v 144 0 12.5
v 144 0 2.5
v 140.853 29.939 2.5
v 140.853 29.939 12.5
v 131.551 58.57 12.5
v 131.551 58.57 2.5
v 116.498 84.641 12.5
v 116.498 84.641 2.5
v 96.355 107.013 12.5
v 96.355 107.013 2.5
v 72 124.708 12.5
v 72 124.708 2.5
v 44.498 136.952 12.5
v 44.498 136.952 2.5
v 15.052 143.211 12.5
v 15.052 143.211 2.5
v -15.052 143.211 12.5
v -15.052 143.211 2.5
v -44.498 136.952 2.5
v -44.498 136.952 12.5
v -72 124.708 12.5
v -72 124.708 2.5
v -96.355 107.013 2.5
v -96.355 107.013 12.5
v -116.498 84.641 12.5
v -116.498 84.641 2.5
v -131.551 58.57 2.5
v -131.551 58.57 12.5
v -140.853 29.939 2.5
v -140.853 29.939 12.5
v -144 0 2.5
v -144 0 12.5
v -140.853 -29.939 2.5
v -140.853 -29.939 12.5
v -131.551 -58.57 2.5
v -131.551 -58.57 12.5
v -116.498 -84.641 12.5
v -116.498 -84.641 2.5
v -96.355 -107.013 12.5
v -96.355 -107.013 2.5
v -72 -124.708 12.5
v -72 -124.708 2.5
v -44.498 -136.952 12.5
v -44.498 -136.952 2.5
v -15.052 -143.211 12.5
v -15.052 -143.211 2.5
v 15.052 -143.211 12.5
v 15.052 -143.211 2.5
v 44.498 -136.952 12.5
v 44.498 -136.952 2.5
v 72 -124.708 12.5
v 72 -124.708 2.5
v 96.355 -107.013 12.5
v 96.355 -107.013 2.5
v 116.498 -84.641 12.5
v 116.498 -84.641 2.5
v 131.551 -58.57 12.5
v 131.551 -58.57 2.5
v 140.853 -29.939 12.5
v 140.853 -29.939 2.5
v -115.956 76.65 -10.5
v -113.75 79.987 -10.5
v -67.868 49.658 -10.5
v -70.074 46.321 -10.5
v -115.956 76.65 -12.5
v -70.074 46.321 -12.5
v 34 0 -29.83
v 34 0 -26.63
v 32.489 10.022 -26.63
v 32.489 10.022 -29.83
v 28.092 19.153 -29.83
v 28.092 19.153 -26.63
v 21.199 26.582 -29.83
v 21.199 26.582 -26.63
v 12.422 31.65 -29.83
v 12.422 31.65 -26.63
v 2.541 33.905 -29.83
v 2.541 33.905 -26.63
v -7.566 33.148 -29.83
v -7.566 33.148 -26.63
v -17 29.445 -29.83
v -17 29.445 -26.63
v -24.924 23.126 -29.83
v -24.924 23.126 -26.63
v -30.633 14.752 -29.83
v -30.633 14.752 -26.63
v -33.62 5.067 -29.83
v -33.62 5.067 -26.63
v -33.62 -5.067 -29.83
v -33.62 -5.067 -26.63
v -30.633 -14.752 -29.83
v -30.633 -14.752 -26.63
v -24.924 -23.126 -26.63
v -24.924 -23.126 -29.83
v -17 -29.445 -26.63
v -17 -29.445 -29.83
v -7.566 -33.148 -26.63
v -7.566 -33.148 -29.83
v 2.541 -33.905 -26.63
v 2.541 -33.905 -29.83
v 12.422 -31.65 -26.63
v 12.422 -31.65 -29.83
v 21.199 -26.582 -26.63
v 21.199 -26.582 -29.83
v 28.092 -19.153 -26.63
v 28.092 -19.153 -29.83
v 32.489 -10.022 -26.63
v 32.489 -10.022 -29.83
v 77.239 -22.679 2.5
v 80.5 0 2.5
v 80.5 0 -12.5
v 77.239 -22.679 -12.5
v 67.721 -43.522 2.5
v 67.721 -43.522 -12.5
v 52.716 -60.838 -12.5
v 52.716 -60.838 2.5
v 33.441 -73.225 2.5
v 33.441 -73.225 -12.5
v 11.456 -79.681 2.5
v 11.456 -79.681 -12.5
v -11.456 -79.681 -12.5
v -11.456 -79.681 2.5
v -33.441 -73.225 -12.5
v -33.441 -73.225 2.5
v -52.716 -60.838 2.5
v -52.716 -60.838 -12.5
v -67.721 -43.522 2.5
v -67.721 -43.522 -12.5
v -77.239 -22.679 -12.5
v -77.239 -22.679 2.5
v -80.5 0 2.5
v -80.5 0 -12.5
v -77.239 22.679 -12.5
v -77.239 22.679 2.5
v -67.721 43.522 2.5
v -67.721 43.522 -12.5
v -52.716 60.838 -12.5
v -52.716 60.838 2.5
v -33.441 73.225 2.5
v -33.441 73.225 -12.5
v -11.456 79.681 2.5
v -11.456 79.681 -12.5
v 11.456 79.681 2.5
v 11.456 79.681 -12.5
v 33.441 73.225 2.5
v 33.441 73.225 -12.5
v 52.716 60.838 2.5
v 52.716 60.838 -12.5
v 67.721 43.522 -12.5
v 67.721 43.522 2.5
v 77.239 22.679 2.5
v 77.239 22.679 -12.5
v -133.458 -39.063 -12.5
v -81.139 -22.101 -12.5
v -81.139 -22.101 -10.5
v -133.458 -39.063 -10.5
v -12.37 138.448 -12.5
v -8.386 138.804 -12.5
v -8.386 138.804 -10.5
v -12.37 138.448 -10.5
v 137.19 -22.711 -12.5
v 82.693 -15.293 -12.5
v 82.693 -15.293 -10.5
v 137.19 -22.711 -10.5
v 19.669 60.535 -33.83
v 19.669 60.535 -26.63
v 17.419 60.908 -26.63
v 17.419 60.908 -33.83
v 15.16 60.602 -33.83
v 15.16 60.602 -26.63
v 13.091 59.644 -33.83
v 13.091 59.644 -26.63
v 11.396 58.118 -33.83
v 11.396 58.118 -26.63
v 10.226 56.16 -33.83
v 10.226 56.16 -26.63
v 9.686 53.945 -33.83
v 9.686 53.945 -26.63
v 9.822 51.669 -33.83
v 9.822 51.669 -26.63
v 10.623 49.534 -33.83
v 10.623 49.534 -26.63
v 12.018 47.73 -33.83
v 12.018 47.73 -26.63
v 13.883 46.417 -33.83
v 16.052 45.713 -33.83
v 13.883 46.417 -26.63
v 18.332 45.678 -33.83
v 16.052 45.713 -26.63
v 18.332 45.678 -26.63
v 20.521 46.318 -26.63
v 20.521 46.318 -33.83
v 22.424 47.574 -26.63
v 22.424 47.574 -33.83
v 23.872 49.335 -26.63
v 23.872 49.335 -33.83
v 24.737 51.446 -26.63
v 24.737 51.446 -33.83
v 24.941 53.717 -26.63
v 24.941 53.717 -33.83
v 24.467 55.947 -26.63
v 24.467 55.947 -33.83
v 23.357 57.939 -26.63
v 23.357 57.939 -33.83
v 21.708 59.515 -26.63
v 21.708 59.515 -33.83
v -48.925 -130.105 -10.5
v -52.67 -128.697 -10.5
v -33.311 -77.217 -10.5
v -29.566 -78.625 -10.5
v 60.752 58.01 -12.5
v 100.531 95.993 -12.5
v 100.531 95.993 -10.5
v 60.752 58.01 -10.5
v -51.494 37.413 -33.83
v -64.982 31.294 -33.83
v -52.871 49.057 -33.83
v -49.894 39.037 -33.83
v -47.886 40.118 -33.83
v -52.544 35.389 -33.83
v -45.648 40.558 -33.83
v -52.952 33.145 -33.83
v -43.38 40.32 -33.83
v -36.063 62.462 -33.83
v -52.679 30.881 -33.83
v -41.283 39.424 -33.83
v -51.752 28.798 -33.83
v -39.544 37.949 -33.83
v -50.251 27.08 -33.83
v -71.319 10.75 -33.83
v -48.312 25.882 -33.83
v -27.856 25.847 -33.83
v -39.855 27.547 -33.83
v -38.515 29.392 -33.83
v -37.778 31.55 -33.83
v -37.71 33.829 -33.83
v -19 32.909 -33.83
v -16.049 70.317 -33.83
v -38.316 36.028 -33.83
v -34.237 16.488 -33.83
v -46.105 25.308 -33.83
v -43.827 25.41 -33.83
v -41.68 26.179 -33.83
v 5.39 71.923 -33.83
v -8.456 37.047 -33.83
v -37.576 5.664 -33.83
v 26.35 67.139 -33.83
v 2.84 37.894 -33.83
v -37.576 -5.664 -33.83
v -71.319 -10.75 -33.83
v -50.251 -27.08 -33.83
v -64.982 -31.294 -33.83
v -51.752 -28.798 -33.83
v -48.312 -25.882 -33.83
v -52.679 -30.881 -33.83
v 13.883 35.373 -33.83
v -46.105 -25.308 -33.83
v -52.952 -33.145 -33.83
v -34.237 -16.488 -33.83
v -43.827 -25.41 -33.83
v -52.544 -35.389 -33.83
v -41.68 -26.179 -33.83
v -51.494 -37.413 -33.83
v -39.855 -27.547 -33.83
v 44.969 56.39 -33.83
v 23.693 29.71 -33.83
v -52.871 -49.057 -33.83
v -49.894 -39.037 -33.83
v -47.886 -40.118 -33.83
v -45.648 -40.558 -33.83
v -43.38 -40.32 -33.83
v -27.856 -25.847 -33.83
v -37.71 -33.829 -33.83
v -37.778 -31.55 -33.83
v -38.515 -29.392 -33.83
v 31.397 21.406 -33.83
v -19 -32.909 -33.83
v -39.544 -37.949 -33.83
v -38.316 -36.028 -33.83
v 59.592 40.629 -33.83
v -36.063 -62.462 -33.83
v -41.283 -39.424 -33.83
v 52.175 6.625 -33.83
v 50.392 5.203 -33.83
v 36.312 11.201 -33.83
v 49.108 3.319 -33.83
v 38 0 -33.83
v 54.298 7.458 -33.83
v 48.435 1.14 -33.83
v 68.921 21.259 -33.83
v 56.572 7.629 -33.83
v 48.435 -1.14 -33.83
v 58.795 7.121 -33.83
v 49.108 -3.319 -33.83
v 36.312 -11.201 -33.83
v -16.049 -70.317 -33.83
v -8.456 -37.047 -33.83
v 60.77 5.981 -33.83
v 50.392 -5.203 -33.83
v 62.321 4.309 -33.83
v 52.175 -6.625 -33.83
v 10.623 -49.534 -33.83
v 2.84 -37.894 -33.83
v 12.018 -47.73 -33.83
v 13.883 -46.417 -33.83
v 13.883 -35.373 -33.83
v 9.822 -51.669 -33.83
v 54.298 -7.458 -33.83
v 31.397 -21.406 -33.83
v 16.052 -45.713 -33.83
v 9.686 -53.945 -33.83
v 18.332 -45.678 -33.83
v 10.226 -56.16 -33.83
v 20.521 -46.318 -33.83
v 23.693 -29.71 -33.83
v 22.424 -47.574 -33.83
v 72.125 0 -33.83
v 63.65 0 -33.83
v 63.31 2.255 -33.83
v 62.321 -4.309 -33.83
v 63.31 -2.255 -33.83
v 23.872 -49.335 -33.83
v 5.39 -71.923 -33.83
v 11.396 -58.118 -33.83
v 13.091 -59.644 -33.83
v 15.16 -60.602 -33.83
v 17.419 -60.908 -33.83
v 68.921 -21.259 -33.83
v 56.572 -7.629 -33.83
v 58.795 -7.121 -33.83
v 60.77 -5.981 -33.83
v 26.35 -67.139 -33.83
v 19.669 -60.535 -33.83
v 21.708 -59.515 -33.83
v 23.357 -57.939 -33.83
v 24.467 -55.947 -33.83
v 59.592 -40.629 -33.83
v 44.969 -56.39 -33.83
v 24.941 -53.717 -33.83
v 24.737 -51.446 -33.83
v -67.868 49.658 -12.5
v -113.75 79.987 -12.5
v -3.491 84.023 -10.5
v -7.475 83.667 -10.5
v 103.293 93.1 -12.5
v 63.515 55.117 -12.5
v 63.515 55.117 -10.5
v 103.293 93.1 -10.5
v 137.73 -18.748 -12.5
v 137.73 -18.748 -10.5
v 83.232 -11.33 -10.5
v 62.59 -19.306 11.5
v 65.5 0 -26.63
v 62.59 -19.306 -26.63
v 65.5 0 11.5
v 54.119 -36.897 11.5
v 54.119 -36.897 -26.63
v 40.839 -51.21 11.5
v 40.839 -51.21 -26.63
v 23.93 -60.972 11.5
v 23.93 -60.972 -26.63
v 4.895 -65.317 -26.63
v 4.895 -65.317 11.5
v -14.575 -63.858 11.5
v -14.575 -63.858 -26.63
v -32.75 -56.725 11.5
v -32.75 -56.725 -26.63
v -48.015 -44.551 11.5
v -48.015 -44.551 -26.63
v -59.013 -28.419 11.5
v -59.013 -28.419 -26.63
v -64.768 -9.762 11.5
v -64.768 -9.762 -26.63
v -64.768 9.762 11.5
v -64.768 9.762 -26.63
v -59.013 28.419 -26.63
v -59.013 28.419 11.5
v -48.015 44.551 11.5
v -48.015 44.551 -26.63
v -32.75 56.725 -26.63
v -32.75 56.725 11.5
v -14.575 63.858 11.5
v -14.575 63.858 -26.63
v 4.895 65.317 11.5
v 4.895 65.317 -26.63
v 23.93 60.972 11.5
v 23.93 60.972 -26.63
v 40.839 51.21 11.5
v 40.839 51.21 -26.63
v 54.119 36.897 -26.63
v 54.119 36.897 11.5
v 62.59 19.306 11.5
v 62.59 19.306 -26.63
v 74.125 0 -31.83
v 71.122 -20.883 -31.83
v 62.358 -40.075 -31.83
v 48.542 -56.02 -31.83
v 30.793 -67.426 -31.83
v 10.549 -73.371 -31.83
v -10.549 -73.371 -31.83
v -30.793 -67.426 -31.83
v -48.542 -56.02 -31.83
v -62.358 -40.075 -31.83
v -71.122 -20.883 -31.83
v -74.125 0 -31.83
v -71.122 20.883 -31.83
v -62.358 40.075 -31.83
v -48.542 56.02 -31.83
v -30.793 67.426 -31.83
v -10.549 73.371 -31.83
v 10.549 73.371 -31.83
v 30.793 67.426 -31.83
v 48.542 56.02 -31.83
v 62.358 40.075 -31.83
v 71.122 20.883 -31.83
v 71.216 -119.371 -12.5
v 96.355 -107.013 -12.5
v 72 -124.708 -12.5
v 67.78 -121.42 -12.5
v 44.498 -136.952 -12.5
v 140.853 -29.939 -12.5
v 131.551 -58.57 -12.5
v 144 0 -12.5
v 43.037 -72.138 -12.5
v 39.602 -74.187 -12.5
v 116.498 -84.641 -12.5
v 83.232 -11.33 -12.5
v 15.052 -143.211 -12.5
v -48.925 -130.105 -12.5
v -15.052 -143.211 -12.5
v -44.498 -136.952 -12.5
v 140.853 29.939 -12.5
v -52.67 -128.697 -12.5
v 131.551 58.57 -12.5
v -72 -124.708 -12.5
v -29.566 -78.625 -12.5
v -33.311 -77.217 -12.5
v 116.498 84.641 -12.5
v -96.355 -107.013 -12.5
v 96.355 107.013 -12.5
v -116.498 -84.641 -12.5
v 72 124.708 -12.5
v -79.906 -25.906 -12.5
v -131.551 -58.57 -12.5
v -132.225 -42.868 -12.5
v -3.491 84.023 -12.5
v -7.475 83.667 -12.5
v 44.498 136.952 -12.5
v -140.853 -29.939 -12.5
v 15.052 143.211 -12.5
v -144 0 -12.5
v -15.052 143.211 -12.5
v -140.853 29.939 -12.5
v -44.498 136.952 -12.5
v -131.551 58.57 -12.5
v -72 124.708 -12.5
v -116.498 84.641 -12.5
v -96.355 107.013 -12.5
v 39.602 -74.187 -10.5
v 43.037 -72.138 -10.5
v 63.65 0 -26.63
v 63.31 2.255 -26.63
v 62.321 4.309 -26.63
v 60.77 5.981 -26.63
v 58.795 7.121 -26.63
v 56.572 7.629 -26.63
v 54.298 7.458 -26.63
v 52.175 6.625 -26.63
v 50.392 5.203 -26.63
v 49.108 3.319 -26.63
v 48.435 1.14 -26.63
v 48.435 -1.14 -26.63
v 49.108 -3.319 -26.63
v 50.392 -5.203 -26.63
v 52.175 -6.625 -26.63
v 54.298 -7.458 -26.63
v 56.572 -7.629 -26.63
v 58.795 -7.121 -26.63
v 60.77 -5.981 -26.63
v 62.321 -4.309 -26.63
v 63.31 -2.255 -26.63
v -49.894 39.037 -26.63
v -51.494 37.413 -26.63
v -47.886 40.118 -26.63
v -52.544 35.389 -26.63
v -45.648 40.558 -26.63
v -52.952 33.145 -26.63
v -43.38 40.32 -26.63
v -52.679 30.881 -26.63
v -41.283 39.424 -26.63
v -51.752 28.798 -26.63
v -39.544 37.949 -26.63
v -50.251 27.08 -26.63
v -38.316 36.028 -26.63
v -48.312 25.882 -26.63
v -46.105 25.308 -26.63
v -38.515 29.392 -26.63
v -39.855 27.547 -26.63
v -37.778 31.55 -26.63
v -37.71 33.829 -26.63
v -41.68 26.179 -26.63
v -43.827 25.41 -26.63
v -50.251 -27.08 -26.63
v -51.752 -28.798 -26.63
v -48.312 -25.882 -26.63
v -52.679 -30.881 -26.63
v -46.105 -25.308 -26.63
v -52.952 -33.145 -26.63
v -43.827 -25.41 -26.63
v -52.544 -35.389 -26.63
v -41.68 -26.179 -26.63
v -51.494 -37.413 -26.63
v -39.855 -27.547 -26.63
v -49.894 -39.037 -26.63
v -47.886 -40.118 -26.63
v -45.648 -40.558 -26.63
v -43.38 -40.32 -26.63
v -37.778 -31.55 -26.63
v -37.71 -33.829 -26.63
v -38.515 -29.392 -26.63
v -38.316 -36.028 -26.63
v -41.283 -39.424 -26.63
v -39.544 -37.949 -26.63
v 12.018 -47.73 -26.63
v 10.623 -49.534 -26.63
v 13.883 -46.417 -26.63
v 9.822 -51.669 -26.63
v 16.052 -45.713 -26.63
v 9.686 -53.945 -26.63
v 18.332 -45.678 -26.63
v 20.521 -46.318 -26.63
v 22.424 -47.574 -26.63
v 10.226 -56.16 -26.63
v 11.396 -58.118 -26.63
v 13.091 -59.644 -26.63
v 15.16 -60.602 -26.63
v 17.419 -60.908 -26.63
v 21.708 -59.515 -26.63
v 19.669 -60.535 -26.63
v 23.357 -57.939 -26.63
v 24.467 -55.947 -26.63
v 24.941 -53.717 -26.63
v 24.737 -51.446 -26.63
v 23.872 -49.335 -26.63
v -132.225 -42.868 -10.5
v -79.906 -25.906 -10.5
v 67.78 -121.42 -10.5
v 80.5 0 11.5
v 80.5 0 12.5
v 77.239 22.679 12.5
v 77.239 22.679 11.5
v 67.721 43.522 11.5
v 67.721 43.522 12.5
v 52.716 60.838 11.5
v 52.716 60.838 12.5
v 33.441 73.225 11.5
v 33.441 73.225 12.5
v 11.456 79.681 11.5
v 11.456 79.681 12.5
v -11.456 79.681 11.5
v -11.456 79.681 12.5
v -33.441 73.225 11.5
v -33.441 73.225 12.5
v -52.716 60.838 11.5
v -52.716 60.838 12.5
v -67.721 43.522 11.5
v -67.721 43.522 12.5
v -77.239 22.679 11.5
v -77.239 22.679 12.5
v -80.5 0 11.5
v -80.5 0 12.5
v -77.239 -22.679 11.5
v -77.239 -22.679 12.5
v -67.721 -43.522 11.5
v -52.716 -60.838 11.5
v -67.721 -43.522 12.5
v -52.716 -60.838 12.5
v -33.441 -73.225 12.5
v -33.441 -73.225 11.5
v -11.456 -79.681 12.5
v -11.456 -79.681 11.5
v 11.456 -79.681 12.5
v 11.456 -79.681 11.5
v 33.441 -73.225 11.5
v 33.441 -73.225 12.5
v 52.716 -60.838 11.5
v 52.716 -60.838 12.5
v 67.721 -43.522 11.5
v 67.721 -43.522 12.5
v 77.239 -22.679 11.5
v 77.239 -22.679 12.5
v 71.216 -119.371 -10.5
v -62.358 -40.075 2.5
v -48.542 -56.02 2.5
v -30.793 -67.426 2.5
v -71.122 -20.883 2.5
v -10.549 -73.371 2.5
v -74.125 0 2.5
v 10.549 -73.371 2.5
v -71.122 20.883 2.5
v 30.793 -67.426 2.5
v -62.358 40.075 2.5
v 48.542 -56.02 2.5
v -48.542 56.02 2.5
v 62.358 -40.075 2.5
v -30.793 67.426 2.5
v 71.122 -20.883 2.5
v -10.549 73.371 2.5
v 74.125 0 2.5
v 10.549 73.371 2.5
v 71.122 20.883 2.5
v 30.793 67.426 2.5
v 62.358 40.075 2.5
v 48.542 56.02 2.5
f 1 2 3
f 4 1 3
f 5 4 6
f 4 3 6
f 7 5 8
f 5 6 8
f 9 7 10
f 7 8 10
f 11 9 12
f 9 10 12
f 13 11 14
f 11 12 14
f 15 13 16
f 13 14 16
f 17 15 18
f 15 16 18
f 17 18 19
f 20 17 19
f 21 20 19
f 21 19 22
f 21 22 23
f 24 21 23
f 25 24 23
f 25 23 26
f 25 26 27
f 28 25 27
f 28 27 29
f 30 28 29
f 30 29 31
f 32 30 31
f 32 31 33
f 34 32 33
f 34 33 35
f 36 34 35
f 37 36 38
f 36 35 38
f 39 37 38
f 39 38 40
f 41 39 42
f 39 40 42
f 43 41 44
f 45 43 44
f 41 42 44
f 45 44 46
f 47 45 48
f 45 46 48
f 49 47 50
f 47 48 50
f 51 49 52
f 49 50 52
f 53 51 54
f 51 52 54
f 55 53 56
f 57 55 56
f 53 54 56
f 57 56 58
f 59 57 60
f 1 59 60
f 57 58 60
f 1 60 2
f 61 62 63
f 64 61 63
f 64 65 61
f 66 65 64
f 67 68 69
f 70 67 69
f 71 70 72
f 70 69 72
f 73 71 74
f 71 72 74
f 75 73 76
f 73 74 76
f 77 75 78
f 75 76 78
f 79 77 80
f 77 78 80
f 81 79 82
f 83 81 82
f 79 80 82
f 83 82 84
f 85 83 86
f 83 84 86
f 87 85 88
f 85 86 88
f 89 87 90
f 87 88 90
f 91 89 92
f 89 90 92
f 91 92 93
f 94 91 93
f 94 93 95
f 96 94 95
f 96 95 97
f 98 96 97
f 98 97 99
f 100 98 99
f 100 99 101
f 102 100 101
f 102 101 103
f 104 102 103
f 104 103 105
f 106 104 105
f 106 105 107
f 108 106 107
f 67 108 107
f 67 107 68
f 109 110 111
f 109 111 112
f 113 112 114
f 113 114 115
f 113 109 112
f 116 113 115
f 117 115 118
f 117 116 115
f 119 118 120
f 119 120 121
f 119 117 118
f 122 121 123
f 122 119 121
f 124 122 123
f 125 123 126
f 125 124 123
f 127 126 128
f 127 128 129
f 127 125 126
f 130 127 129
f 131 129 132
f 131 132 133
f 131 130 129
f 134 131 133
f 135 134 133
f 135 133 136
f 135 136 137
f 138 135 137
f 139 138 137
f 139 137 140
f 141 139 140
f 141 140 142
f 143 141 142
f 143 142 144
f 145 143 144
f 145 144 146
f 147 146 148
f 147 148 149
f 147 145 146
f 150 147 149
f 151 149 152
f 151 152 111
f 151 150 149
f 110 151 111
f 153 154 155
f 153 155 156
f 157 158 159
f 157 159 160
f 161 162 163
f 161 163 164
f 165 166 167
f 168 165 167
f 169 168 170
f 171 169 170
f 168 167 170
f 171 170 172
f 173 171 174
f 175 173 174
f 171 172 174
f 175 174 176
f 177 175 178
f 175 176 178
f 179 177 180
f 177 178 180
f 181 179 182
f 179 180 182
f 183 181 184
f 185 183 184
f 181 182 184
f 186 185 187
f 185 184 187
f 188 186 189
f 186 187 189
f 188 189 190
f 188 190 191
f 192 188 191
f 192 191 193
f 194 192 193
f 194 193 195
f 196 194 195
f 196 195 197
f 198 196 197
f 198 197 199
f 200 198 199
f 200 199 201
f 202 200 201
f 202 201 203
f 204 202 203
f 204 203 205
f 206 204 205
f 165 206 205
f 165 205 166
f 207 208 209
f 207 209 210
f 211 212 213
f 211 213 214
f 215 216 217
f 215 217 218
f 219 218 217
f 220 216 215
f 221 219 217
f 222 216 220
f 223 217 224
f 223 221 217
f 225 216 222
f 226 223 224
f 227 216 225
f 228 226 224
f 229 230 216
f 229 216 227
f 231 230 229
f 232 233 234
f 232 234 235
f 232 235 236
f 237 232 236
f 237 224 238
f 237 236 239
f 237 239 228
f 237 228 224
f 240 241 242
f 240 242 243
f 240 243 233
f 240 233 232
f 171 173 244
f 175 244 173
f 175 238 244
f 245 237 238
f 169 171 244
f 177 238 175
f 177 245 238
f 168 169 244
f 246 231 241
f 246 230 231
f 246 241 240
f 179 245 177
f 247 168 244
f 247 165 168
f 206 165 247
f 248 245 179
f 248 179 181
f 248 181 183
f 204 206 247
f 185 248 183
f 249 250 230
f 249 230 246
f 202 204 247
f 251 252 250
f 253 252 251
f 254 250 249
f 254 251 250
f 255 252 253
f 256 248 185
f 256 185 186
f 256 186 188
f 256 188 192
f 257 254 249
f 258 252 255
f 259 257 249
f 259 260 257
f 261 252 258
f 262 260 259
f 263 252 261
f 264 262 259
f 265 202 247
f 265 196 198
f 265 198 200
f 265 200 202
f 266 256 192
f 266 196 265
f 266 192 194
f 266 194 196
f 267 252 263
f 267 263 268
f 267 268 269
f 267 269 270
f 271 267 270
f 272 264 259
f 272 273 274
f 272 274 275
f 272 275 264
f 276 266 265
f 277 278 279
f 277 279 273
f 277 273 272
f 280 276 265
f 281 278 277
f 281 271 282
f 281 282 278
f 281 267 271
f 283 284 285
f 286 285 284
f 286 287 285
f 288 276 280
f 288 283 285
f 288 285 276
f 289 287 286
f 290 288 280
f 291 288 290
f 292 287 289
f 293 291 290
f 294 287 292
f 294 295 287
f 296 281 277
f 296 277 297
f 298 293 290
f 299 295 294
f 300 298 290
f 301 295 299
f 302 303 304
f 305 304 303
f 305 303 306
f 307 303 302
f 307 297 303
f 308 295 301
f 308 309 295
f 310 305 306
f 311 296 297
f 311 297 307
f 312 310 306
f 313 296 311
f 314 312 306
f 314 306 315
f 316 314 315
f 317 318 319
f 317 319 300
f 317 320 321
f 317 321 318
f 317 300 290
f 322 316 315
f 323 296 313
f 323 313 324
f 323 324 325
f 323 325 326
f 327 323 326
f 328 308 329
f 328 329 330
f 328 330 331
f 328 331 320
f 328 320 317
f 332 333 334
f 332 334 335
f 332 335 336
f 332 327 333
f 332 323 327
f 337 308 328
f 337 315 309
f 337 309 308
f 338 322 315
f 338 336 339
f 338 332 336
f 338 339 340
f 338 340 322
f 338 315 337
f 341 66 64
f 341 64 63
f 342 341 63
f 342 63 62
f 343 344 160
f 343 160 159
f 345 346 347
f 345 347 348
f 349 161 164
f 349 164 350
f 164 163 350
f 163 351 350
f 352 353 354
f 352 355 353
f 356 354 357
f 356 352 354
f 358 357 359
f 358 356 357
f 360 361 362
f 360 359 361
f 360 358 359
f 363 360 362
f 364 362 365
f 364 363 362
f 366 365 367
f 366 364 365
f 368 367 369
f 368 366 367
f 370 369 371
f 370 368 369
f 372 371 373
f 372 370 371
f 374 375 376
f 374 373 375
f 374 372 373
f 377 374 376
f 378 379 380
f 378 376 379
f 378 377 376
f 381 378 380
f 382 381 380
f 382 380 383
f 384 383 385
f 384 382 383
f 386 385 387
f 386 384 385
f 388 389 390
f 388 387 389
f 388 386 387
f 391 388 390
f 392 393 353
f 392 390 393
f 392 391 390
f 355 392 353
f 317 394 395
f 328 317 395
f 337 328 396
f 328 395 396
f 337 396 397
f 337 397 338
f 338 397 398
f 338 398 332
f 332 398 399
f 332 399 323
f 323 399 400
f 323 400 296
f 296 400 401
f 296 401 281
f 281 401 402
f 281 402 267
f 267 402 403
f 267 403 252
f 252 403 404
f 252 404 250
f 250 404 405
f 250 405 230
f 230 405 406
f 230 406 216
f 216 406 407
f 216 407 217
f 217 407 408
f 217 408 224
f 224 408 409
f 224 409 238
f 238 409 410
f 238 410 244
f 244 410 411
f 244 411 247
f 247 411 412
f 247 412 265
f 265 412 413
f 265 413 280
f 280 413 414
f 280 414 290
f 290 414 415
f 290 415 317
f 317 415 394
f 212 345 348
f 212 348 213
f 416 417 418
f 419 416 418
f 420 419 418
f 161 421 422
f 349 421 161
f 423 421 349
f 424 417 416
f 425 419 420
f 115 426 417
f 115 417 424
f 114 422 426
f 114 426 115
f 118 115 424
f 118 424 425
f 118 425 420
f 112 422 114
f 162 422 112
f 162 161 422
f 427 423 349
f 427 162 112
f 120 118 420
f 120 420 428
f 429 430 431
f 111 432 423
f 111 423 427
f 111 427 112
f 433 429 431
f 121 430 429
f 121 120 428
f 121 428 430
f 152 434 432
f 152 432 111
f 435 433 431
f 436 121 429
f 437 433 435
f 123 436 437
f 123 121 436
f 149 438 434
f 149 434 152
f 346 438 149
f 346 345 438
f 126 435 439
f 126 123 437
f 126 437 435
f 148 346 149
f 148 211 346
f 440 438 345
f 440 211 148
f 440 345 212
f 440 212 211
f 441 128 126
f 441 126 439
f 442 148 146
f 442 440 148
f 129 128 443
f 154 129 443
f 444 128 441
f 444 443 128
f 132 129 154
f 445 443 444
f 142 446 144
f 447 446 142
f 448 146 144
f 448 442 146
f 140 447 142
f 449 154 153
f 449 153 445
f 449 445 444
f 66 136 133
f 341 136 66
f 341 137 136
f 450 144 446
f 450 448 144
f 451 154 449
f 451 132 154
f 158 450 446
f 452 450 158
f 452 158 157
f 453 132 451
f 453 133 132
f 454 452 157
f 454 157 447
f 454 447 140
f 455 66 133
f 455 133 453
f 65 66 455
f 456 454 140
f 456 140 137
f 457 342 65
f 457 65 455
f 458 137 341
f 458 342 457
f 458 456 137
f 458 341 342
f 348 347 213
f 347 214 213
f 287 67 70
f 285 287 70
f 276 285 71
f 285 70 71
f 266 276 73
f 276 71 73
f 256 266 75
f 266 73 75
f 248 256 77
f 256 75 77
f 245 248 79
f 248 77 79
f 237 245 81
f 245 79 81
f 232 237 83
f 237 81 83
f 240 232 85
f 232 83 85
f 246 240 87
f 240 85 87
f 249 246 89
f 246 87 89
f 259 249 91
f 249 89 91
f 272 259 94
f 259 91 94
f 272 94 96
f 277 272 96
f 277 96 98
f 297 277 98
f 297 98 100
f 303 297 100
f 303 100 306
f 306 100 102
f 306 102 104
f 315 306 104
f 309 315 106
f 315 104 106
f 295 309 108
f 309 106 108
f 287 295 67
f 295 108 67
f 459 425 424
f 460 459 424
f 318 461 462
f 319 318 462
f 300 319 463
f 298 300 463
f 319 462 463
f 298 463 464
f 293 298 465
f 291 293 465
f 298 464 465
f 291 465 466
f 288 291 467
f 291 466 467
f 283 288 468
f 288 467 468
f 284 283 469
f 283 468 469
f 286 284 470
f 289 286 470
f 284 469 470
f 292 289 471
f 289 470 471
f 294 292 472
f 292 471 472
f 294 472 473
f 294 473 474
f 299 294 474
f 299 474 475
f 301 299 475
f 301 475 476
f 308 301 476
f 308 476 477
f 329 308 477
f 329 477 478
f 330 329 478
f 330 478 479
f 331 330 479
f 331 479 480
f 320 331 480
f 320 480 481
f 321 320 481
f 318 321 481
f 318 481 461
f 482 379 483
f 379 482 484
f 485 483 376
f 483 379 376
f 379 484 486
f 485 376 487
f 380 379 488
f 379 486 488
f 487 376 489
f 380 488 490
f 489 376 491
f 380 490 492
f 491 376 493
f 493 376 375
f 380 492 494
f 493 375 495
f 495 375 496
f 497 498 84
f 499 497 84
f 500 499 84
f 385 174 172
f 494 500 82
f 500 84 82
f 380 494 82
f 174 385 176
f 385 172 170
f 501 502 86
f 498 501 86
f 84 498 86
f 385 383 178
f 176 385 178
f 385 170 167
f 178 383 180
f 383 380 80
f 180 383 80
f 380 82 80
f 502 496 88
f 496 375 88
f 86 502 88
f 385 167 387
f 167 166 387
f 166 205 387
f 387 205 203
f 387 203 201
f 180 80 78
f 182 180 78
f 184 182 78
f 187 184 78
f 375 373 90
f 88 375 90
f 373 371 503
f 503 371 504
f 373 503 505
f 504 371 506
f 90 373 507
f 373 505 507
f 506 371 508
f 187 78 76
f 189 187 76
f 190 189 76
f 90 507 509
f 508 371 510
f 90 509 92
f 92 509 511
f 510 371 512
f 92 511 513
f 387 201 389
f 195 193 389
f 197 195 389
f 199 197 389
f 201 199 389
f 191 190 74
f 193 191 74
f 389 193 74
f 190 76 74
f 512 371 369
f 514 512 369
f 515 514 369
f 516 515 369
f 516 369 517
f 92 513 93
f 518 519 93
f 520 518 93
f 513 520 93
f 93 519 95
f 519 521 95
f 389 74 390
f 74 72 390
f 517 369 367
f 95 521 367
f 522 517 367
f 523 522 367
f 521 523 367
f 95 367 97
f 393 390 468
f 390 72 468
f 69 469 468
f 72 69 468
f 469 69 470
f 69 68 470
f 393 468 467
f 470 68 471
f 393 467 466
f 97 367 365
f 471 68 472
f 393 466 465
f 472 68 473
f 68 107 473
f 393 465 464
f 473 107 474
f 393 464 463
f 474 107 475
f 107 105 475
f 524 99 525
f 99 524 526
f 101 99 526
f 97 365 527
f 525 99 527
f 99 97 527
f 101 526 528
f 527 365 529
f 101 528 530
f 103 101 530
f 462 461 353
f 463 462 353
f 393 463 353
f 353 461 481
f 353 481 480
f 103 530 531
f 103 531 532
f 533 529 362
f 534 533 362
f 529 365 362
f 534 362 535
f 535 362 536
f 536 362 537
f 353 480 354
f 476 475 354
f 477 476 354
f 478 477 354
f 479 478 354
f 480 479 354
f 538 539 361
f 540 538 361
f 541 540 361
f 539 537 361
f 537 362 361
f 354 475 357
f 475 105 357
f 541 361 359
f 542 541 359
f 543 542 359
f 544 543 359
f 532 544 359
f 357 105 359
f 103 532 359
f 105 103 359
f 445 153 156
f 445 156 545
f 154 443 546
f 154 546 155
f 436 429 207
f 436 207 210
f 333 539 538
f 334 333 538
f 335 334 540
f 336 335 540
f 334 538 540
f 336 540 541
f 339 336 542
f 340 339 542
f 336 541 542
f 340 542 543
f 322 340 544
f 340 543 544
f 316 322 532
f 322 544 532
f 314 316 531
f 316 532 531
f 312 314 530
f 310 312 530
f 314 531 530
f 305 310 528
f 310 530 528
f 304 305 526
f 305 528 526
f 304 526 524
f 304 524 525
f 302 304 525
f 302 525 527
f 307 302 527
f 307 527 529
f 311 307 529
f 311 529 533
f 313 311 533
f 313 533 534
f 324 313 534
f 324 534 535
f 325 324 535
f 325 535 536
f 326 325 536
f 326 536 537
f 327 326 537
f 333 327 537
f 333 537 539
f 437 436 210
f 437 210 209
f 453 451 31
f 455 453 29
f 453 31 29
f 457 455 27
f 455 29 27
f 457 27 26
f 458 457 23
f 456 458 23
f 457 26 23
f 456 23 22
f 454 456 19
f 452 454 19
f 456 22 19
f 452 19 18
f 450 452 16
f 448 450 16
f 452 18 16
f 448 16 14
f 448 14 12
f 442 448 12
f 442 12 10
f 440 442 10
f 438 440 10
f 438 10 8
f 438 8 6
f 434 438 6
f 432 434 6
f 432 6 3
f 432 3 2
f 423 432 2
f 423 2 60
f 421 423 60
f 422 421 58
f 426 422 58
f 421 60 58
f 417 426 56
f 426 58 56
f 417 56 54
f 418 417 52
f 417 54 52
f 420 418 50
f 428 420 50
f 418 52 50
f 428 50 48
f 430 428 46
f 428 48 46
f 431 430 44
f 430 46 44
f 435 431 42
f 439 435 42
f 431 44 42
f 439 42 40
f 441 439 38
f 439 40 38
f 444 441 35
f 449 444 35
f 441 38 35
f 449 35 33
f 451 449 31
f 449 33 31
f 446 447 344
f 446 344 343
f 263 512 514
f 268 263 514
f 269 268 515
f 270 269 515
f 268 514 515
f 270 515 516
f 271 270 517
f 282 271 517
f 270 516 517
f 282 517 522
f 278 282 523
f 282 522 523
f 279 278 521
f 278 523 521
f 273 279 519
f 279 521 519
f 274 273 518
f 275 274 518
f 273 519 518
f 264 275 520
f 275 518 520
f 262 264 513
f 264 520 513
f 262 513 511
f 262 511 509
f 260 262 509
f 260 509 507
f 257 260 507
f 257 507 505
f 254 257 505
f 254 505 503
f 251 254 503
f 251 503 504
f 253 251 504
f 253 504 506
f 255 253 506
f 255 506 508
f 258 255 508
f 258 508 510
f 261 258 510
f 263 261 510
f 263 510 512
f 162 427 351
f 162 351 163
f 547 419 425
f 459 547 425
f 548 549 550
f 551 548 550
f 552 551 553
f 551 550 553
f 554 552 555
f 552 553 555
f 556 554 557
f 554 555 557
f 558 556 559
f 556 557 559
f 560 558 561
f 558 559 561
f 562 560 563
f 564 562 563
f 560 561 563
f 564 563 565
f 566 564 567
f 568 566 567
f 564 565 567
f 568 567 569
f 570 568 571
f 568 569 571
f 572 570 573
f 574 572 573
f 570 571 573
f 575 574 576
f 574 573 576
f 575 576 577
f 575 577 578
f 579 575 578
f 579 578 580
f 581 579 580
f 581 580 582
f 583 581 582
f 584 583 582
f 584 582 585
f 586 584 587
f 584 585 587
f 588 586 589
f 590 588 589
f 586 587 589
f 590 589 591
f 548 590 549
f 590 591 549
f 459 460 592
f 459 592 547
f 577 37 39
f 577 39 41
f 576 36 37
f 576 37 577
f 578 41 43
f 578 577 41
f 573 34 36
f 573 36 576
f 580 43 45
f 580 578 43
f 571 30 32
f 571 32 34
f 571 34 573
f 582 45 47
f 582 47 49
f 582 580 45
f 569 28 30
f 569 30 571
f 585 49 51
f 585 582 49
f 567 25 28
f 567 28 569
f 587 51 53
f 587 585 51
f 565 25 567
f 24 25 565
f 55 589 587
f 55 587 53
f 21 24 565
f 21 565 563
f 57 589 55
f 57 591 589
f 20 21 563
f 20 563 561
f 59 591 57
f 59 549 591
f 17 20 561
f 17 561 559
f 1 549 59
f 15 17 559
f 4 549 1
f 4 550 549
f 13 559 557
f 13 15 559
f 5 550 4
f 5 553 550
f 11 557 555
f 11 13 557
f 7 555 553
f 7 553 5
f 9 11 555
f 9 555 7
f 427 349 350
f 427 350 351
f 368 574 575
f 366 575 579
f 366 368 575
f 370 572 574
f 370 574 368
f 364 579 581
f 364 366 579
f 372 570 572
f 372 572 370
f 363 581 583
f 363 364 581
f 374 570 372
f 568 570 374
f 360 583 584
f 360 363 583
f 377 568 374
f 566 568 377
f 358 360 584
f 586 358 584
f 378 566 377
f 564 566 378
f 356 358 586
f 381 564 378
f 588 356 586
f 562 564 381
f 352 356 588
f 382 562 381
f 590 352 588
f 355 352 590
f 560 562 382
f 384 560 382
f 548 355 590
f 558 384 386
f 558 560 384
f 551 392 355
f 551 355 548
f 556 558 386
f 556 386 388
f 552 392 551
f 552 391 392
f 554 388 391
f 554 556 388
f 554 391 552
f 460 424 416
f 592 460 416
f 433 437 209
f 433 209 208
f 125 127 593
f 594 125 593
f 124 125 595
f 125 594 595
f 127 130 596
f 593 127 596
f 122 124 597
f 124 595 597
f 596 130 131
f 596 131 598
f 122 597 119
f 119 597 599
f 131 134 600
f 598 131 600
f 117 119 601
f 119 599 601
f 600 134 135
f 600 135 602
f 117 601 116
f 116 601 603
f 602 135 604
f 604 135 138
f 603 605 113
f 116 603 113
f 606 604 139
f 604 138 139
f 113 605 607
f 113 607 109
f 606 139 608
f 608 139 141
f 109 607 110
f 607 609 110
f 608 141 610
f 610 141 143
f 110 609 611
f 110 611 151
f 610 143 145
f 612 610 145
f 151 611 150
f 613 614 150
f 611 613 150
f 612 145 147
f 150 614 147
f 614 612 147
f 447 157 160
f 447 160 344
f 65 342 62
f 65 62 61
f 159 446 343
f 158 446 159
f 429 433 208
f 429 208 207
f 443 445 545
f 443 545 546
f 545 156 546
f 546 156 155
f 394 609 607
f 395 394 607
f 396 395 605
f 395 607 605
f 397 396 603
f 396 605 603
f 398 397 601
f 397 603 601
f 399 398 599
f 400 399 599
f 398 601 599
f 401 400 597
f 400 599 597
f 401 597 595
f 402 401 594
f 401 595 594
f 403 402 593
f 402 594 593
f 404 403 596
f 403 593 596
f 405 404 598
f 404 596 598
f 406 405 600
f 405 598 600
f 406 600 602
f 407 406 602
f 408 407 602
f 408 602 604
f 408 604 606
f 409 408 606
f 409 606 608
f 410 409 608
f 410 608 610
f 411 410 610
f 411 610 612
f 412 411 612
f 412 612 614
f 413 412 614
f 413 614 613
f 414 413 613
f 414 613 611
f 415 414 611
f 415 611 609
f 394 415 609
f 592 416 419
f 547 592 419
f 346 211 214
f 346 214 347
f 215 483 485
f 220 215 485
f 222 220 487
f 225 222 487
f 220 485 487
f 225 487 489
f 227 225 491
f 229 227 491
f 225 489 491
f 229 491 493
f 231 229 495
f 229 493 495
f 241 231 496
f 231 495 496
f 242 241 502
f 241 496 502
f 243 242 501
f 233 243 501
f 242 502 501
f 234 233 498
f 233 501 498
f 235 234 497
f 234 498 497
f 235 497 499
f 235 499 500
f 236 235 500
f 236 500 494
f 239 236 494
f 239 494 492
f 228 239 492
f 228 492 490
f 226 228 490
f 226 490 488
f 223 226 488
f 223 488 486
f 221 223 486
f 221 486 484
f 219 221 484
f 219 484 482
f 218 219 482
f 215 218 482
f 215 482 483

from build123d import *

# Parameters (mm, degrees)
BOSS_EXTRUDE1_START = 2.5
SKETCH1_R           = 144
BOSS_EXTRUDE1_DEPTH = 10
SKETCH2_R           = 80.5
CUT_EXTRUDE1_DEPTH  = 1
SKETCH3_R           = 65.5
CUT_EXTRUDE2_DEPTH  = 204.845529752
SKETCH4_R           = 74.125
SKETCH4_R_2         = 65.5
BOSS_EXTRUDE3_DEPTH = 36.33
BOSS_EXTRUDE4_START = -7.2
SKETCH5_R           = 74.125
BOSS_EXTRUDE4_DEPTH = 7.2
SKETCH6_R           = 34
CUT_EXTRUDE3_DEPTH  = 17.2
SKETCH7_R           = 144
SKETCH7_R_2         = 80.5
BOSS_EXTRUDE5_DEPTH = 15
CHAMFER2_SIZE       = 4
SKETCH10_R          = 7.65
CUT_EXTRUDE4_DEPTH  = 207.437566591
CIRPATTERN2_COUNT   = 5
CHAMFER3_SIZE       = 2
CUT_EXTRUDE6_DEPTH  = 2


with BuildPart() as part:
    # Sketch1 → Boss-Extrude1 (new body)
    with BuildSketch(Plane.XY.offset(BOSS_EXTRUDE1_START)):
        Circle(SKETCH1_R)
    extrude(amount=BOSS_EXTRUDE1_DEPTH)

    # Sketch2 → Cut-Extrude1 (cut)
    with BuildSketch(Plane.XY.offset(12.5)):
        Circle(SKETCH2_R)
    extrude(amount=-CUT_EXTRUDE1_DEPTH, mode=Mode.SUBTRACT)

    # Sketch3 → Cut-Extrude2 (cut, through all)
    with BuildSketch(Plane.XY.offset(11.5)):
        Circle(SKETCH3_R)
    extrude(amount=-CUT_EXTRUDE2_DEPTH, mode=Mode.SUBTRACT)

    # Sketch4 → Boss-Extrude3 (add)
    with BuildSketch(Plane(origin=(0, 0, 2.5), x_dir=(-1, 0, 0), z_dir=(0, 0, -1))):
        with Locations(Location((0, 0, 0), (0, 0, 180))):
            Circle(SKETCH4_R)
        with Locations(Location((0, 0, 0), (0, 0, 180))):
            Circle(SKETCH4_R_2, mode=Mode.SUBTRACT)
    extrude(amount=BOSS_EXTRUDE3_DEPTH)

    # Sketch5 → Boss-Extrude4 (add)
    with BuildSketch(Plane(origin=(0, 0, -33.83), x_dir=(-1, 0, 0), z_dir=(0, 0, -1)).offset(BOSS_EXTRUDE4_START)):
        with Locations(Location((0, 0, 0), (0, 0, 180))):
            Circle(SKETCH5_R)
    extrude(amount=BOSS_EXTRUDE4_DEPTH)

    # Sketch6 → Cut-Extrude3 (cut)
    with BuildSketch(Plane.XY.offset(-26.63)):
        Circle(SKETCH6_R)
    extrude(amount=-CUT_EXTRUDE3_DEPTH, mode=Mode.SUBTRACT)

    # Sketch7 → Boss-Extrude5 (add)
    with BuildSketch(Plane(origin=(0, 0, 2.5), x_dir=(-1, 0, 0), z_dir=(0, 0, -1))):
        Circle(SKETCH7_R)
        with Locations(Location((0, 0, 0), (0, 0, 180))):
            Circle(SKETCH7_R_2, mode=Mode.SUBTRACT)
    extrude(amount=BOSS_EXTRUDE5_DEPTH)

    # Chamfer2
    chamfer2_edges = [part.edges().sort_by_distance(p)[0] for p in [
        (-34, 0, -33.83),
    ]]
    chamfer(chamfer2_edges, length=CHAMFER2_SIZE)

    # Sketch10 → Cut-Extrude4 (cut, through all)
    with BuildSketch(Plane.XY):
        with Locations((56, 0)):
            Circle(SKETCH10_R)
    cut_extrude4 = extrude(amount=-CUT_EXTRUDE4_DEPTH, mode=Mode.SUBTRACT)

    # CirPattern2: Cut-Extrude4 ×5 about axis
    cirpattern2_axis = Axis((0, 0, 0), (0, 0, 1))
    for i in range(1, CIRPATTERN2_COUNT):
        add(cut_extrude4.rotate(cirpattern2_axis, i * 360 / CIRPATTERN2_COUNT), mode=Mode.SUBTRACT)

    # Chamfer3
    chamfer3_edges = [part.edges().sort_by_distance(p)[0] for p in [
        (-74.125, 0, -33.83),
    ]]
    chamfer(chamfer3_edges, length=CHAMFER3_SIZE)

    # Sketch12 → Cut-Extrude6 (cut)
    with BuildSketch(Plane(origin=(0, 0, -12.5), x_dir=(-1, 0, 0), z_dir=(0, 0, -1))):
        Polygon((-43.036764008, -72.137625021), (-71.215597585, -119.370593785), (-67.780472584, -121.4199635), (-39.601639007, -74.186994736), align=None)
        Polygon((-82.692946132, -15.293026515), (-137.190383486, -22.711201621), (-137.72988713, -18.747751632), (-83.232449776, -11.329576526), align=None)
        Polygon((-63.514778191, 55.116902592), (-103.293137449, 93.099558302), (-100.530762488, 95.992529884), (-60.75240323, 58.009874175), align=None)
        Polygon((3.491313194, 84.022679868), (8.385947883, 138.804451939), (12.370076761, 138.448478507), (7.475442071, 83.666706436), align=None)
        Polygon((67.868374533, 49.657665453), (113.750243417, 79.986762171), (115.955995905, 76.64989898), (70.074127022, 46.320802261), align=None)
        Polygon((81.139165587, -22.10058388), (133.458285575, -39.062590944), (132.224685062, -42.867617853), (79.905565073, -25.905610789), align=None)
        Polygon((33.310510016, -77.216642782), (52.669516643, -128.697016347), (48.925489474, -130.104944102), (29.566482848, -78.624570536), align=None)
    extrude(amount=-CUT_EXTRUDE6_DEPTH, mode=Mode.SUBTRACT)


solid = part.part
